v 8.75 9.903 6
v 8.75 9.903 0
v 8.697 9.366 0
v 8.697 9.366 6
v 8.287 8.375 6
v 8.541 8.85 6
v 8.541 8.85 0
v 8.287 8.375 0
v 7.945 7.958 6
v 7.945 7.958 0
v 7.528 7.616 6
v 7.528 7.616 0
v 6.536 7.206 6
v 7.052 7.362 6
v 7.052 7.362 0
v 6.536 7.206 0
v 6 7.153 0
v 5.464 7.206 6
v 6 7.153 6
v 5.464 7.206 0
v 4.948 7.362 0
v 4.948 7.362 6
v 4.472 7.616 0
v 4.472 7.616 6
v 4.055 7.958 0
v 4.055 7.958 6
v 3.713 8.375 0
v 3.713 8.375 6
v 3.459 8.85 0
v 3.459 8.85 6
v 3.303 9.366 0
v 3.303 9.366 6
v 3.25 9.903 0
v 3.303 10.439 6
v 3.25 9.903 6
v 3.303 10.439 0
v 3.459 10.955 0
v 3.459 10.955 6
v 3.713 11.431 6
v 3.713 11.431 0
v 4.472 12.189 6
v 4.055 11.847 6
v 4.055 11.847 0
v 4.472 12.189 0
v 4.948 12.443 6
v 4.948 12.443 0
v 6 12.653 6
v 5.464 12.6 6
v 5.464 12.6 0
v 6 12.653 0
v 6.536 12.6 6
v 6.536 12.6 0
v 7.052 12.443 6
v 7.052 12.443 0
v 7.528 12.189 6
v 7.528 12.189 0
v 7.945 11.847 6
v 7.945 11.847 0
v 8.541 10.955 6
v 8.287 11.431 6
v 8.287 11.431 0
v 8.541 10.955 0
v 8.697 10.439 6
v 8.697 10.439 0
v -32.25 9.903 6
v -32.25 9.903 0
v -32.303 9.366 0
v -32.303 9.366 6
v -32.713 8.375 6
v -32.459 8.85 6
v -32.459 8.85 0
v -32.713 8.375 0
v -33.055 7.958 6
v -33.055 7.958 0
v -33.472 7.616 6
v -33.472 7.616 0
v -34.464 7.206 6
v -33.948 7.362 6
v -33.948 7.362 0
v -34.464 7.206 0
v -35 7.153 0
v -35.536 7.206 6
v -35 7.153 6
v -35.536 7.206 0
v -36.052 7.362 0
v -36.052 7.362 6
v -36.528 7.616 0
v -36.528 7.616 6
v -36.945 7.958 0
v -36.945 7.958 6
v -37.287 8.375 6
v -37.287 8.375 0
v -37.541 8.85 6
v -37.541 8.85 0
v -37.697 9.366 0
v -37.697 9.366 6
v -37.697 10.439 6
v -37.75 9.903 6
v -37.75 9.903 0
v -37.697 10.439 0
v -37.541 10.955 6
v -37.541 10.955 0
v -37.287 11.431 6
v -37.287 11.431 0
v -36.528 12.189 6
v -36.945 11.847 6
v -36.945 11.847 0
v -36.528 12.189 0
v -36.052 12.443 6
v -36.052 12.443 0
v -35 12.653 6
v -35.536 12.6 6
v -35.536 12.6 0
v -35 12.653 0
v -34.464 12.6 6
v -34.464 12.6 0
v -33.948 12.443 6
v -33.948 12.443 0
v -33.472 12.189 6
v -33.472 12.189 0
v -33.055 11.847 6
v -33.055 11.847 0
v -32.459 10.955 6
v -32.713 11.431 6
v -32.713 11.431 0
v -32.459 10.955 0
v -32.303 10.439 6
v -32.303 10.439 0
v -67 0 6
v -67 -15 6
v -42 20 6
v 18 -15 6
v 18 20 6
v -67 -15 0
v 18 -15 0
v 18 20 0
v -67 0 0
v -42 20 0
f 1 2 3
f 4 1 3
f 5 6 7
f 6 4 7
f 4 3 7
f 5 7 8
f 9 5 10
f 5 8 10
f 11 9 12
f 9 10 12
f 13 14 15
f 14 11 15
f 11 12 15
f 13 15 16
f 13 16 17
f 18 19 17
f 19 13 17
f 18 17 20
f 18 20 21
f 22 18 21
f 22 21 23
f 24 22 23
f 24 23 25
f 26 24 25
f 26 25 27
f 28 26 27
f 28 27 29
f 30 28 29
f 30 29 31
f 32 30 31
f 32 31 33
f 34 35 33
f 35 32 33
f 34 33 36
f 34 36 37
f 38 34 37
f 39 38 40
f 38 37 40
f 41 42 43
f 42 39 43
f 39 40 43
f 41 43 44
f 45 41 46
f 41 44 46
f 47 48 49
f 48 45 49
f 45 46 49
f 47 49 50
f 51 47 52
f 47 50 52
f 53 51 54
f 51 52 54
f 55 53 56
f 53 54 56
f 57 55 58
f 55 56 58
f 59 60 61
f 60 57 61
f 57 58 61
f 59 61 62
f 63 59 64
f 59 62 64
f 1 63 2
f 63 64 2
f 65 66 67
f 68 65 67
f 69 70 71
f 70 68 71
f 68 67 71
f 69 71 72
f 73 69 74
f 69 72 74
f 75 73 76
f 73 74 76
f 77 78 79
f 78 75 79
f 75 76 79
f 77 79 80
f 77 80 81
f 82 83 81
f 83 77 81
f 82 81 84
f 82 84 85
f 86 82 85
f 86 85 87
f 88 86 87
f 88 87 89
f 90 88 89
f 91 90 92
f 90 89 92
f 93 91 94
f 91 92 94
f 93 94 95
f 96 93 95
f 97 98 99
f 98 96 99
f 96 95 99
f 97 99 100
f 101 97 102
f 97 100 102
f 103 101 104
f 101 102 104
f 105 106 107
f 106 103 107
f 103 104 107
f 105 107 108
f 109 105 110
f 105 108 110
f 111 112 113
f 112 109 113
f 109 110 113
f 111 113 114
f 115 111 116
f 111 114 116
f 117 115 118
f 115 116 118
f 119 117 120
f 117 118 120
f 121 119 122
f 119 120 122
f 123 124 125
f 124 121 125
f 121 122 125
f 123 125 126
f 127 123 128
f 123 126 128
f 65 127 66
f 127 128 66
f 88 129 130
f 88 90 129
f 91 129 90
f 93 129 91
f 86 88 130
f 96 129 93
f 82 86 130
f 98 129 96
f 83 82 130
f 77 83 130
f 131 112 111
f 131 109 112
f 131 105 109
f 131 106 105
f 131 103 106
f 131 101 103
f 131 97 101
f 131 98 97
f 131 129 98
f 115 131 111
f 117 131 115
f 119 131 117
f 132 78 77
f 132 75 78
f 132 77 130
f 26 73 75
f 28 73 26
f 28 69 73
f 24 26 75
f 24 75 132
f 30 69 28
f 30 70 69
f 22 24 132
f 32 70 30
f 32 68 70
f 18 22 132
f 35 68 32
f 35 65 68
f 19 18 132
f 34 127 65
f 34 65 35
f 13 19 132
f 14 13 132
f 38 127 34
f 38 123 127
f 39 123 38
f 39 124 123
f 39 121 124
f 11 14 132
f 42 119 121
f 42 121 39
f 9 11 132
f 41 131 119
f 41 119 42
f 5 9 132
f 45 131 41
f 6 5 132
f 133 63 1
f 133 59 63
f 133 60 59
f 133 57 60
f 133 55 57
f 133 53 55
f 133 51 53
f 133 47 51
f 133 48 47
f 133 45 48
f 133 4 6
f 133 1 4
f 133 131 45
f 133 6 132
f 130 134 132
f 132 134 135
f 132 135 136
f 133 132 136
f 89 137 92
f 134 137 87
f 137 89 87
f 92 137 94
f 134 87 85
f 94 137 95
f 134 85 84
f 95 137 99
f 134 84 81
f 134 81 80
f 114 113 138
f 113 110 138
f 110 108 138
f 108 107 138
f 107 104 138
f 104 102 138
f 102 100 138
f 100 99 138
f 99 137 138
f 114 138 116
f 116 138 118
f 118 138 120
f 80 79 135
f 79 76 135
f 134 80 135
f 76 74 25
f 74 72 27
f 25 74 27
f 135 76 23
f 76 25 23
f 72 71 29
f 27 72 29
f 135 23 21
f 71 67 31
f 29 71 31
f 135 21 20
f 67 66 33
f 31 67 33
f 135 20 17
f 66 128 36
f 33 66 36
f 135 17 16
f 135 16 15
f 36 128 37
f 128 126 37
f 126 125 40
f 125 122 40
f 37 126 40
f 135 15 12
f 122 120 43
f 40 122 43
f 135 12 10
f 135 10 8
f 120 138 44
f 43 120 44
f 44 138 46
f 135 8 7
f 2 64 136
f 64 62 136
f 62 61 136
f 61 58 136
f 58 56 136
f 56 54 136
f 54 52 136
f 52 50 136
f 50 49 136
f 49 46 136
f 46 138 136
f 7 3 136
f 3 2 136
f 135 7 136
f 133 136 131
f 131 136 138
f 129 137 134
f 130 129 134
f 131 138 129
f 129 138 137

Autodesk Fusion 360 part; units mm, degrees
sketch "Z Endswitch plate" plane through (0, 0, 0) normal (0, 0, 1) x (1, 0, 0)
  line L0 (18, -15) -> (18, 20)
  circle A0 centre (6, 9.9027) radius 2.75
  line L1 (-67, 20) -> (-67, -15)
  line L2 (-67, -15) -> (18, -15)
  line L3 (-42, 20) -> (-67, 0)
  circle A1 centre (-35, 9.9027) radius 2.75
  line L4 (18, 20) -> (-67, 20)
  line L5 (18, 9.9027) -> (-67, 9.9027) construction
  dimension "d2" = 85
  dimension "d3" = 5.5
  dimension "d4" = 5.5
  dimension "d7" = 25
  dimension "d8" = 20
  dimension "d9" = 15
  dimension "d10" = 18
  dimension "d11" = 6
  dimension "d12" = 35
extrude "Extrude1" add sketch "Z Endswitch plate" along normal blind 6 contours L0 L1 L2 L3 L4
